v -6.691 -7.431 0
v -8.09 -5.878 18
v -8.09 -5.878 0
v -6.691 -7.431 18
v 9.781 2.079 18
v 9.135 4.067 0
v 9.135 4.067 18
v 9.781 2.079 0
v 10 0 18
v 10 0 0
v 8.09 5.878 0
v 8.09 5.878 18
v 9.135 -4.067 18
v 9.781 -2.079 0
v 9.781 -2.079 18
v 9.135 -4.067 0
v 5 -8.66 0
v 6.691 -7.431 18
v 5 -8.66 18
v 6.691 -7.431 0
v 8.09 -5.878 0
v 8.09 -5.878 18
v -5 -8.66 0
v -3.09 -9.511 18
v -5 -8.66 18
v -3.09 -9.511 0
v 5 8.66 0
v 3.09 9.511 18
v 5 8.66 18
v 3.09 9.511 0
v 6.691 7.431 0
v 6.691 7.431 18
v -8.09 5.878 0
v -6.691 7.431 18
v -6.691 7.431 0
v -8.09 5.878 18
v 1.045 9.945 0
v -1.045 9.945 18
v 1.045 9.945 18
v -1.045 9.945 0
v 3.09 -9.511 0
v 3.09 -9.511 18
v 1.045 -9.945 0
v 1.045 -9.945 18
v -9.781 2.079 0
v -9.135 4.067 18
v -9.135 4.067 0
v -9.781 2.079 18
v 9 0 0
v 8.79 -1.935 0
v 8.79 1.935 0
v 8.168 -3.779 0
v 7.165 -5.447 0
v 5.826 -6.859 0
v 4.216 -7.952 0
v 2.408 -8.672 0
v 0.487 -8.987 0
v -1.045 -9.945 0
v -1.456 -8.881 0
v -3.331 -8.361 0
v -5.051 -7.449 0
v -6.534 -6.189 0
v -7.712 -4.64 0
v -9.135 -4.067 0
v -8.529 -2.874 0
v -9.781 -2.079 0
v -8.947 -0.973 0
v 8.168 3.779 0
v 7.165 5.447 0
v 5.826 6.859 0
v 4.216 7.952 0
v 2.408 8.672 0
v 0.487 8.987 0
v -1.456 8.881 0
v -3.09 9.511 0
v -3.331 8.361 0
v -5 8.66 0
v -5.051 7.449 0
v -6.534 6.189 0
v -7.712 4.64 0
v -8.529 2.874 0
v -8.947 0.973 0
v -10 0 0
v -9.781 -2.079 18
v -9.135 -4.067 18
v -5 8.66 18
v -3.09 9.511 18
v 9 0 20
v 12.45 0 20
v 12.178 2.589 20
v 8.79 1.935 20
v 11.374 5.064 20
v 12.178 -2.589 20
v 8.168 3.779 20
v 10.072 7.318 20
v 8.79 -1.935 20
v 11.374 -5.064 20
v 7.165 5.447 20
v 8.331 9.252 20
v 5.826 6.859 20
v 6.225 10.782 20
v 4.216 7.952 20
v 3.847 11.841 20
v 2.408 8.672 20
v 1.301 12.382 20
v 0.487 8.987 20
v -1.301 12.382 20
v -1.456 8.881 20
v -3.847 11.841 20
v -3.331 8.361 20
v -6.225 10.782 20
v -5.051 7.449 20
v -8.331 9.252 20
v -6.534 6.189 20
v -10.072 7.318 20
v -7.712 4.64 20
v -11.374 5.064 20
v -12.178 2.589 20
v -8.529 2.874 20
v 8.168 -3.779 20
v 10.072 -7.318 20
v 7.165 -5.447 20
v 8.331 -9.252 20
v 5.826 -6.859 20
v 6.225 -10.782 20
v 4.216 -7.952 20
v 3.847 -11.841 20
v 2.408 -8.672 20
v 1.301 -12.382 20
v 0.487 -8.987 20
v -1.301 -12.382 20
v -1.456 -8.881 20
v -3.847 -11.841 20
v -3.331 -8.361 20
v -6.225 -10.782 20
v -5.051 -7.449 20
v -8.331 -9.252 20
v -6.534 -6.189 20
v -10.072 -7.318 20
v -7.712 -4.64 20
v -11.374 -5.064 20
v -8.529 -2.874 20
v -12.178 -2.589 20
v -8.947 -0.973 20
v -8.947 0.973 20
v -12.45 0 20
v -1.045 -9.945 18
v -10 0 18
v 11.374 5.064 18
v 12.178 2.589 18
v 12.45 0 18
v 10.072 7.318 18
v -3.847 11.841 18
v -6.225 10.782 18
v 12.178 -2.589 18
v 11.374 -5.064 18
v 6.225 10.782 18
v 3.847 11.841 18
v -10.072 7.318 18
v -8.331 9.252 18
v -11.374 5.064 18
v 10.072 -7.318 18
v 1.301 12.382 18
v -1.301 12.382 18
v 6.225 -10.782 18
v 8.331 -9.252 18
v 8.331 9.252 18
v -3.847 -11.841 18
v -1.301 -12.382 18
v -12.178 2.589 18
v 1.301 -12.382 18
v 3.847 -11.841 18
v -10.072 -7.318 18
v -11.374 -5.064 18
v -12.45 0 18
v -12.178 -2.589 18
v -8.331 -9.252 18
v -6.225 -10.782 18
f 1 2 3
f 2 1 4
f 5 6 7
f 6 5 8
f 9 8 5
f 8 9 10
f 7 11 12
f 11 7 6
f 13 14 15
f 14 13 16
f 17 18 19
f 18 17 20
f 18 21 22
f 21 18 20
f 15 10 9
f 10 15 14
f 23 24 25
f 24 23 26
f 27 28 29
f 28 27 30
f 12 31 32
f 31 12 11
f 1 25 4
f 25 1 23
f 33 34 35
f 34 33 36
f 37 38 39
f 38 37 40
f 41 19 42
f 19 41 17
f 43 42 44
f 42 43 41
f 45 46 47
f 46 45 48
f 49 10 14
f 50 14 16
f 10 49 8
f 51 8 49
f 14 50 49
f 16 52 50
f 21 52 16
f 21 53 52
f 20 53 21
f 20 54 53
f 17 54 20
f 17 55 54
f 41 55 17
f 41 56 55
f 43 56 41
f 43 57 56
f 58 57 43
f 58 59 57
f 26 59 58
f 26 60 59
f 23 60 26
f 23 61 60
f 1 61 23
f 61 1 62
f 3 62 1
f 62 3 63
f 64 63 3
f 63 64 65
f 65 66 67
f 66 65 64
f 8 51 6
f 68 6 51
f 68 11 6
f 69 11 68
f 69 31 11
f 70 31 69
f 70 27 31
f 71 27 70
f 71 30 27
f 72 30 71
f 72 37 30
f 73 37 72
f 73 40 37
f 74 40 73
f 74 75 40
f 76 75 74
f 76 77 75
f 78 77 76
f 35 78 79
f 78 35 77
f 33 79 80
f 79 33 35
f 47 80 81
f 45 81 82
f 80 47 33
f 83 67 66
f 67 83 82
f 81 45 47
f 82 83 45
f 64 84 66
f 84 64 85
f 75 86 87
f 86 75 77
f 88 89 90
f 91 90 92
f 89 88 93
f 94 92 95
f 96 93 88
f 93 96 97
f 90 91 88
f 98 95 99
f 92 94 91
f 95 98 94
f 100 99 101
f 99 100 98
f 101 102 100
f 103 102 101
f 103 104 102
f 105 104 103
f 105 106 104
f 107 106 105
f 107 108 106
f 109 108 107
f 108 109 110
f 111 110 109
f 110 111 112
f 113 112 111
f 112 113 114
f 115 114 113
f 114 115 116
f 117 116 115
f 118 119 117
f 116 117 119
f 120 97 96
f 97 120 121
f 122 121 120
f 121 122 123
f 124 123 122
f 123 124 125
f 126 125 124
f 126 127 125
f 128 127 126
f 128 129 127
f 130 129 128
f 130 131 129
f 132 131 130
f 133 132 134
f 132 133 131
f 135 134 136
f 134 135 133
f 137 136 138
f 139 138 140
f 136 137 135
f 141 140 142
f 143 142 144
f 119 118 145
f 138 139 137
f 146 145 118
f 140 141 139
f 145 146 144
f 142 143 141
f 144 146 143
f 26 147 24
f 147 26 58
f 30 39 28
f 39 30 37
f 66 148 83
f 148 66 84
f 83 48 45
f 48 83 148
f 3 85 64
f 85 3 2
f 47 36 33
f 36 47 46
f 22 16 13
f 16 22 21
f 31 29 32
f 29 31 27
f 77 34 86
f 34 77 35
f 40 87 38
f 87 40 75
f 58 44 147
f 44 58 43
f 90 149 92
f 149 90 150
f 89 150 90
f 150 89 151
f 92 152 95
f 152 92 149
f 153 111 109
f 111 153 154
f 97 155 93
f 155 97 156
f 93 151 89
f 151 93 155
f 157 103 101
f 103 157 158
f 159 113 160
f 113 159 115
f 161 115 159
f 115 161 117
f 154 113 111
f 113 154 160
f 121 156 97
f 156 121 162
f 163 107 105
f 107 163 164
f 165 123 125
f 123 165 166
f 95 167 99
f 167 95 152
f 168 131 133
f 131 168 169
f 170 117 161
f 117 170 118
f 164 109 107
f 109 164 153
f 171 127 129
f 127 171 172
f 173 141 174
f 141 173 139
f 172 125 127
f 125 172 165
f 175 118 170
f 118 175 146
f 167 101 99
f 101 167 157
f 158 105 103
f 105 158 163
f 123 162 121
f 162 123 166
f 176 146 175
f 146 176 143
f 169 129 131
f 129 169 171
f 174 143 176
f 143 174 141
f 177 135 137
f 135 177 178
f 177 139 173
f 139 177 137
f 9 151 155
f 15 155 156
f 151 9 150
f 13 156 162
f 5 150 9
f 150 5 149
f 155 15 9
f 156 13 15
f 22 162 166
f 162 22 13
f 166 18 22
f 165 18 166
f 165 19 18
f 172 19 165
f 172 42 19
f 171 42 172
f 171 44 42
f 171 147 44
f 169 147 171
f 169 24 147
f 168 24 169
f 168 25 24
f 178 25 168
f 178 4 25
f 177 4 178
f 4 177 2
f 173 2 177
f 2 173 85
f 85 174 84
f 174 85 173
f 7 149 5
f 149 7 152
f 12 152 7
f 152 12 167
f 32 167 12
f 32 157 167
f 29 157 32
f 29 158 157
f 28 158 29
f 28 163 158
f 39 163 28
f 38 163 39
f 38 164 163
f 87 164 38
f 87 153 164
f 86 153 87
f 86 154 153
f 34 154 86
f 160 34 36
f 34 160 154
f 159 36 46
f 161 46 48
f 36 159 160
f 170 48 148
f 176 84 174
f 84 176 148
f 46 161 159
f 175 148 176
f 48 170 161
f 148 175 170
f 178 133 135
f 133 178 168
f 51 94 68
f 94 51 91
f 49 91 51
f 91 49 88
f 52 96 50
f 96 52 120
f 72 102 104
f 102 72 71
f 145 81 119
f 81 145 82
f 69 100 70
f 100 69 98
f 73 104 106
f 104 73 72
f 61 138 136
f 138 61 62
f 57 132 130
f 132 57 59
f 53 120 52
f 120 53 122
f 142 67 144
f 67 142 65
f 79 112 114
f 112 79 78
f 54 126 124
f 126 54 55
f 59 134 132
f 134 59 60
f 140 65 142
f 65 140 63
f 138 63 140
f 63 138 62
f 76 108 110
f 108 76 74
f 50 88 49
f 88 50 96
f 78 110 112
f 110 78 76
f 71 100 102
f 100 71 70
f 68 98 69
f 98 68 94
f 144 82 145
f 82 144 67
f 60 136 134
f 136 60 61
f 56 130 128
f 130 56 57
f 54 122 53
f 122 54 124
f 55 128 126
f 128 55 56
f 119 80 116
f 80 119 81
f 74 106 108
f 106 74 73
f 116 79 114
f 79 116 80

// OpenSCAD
// file: project.scad
housing_h = 35;
bearing_h  = 20;
insert_h = 8;
insert_pcd = 37.5;

hole_eps = 0.02;
hole_start_eps = 0.01;

boss_holes = [50, 50];
boss_flange_thk = 10;

module thru_hole() {
    translate([0, 0, -hole_start_eps]) children();
}
// main file
include <project.scad>

bearing_od = 20;
bearing_id = 18;
flange_d = 24.9;
flange_thk = 2;


module bearing() {
        color("blue") difference() {
            union() {
                cylinder(d=bearing_od, h=bearing_h);
                translate([0, 0, bearing_h - flange_thk]) cylinder(d=flange_d, h=flange_thk);
            }
            thru_hole() cylinder(d=bearing_id, h=bearing_h+hole_eps);
        }
}

bearing();
